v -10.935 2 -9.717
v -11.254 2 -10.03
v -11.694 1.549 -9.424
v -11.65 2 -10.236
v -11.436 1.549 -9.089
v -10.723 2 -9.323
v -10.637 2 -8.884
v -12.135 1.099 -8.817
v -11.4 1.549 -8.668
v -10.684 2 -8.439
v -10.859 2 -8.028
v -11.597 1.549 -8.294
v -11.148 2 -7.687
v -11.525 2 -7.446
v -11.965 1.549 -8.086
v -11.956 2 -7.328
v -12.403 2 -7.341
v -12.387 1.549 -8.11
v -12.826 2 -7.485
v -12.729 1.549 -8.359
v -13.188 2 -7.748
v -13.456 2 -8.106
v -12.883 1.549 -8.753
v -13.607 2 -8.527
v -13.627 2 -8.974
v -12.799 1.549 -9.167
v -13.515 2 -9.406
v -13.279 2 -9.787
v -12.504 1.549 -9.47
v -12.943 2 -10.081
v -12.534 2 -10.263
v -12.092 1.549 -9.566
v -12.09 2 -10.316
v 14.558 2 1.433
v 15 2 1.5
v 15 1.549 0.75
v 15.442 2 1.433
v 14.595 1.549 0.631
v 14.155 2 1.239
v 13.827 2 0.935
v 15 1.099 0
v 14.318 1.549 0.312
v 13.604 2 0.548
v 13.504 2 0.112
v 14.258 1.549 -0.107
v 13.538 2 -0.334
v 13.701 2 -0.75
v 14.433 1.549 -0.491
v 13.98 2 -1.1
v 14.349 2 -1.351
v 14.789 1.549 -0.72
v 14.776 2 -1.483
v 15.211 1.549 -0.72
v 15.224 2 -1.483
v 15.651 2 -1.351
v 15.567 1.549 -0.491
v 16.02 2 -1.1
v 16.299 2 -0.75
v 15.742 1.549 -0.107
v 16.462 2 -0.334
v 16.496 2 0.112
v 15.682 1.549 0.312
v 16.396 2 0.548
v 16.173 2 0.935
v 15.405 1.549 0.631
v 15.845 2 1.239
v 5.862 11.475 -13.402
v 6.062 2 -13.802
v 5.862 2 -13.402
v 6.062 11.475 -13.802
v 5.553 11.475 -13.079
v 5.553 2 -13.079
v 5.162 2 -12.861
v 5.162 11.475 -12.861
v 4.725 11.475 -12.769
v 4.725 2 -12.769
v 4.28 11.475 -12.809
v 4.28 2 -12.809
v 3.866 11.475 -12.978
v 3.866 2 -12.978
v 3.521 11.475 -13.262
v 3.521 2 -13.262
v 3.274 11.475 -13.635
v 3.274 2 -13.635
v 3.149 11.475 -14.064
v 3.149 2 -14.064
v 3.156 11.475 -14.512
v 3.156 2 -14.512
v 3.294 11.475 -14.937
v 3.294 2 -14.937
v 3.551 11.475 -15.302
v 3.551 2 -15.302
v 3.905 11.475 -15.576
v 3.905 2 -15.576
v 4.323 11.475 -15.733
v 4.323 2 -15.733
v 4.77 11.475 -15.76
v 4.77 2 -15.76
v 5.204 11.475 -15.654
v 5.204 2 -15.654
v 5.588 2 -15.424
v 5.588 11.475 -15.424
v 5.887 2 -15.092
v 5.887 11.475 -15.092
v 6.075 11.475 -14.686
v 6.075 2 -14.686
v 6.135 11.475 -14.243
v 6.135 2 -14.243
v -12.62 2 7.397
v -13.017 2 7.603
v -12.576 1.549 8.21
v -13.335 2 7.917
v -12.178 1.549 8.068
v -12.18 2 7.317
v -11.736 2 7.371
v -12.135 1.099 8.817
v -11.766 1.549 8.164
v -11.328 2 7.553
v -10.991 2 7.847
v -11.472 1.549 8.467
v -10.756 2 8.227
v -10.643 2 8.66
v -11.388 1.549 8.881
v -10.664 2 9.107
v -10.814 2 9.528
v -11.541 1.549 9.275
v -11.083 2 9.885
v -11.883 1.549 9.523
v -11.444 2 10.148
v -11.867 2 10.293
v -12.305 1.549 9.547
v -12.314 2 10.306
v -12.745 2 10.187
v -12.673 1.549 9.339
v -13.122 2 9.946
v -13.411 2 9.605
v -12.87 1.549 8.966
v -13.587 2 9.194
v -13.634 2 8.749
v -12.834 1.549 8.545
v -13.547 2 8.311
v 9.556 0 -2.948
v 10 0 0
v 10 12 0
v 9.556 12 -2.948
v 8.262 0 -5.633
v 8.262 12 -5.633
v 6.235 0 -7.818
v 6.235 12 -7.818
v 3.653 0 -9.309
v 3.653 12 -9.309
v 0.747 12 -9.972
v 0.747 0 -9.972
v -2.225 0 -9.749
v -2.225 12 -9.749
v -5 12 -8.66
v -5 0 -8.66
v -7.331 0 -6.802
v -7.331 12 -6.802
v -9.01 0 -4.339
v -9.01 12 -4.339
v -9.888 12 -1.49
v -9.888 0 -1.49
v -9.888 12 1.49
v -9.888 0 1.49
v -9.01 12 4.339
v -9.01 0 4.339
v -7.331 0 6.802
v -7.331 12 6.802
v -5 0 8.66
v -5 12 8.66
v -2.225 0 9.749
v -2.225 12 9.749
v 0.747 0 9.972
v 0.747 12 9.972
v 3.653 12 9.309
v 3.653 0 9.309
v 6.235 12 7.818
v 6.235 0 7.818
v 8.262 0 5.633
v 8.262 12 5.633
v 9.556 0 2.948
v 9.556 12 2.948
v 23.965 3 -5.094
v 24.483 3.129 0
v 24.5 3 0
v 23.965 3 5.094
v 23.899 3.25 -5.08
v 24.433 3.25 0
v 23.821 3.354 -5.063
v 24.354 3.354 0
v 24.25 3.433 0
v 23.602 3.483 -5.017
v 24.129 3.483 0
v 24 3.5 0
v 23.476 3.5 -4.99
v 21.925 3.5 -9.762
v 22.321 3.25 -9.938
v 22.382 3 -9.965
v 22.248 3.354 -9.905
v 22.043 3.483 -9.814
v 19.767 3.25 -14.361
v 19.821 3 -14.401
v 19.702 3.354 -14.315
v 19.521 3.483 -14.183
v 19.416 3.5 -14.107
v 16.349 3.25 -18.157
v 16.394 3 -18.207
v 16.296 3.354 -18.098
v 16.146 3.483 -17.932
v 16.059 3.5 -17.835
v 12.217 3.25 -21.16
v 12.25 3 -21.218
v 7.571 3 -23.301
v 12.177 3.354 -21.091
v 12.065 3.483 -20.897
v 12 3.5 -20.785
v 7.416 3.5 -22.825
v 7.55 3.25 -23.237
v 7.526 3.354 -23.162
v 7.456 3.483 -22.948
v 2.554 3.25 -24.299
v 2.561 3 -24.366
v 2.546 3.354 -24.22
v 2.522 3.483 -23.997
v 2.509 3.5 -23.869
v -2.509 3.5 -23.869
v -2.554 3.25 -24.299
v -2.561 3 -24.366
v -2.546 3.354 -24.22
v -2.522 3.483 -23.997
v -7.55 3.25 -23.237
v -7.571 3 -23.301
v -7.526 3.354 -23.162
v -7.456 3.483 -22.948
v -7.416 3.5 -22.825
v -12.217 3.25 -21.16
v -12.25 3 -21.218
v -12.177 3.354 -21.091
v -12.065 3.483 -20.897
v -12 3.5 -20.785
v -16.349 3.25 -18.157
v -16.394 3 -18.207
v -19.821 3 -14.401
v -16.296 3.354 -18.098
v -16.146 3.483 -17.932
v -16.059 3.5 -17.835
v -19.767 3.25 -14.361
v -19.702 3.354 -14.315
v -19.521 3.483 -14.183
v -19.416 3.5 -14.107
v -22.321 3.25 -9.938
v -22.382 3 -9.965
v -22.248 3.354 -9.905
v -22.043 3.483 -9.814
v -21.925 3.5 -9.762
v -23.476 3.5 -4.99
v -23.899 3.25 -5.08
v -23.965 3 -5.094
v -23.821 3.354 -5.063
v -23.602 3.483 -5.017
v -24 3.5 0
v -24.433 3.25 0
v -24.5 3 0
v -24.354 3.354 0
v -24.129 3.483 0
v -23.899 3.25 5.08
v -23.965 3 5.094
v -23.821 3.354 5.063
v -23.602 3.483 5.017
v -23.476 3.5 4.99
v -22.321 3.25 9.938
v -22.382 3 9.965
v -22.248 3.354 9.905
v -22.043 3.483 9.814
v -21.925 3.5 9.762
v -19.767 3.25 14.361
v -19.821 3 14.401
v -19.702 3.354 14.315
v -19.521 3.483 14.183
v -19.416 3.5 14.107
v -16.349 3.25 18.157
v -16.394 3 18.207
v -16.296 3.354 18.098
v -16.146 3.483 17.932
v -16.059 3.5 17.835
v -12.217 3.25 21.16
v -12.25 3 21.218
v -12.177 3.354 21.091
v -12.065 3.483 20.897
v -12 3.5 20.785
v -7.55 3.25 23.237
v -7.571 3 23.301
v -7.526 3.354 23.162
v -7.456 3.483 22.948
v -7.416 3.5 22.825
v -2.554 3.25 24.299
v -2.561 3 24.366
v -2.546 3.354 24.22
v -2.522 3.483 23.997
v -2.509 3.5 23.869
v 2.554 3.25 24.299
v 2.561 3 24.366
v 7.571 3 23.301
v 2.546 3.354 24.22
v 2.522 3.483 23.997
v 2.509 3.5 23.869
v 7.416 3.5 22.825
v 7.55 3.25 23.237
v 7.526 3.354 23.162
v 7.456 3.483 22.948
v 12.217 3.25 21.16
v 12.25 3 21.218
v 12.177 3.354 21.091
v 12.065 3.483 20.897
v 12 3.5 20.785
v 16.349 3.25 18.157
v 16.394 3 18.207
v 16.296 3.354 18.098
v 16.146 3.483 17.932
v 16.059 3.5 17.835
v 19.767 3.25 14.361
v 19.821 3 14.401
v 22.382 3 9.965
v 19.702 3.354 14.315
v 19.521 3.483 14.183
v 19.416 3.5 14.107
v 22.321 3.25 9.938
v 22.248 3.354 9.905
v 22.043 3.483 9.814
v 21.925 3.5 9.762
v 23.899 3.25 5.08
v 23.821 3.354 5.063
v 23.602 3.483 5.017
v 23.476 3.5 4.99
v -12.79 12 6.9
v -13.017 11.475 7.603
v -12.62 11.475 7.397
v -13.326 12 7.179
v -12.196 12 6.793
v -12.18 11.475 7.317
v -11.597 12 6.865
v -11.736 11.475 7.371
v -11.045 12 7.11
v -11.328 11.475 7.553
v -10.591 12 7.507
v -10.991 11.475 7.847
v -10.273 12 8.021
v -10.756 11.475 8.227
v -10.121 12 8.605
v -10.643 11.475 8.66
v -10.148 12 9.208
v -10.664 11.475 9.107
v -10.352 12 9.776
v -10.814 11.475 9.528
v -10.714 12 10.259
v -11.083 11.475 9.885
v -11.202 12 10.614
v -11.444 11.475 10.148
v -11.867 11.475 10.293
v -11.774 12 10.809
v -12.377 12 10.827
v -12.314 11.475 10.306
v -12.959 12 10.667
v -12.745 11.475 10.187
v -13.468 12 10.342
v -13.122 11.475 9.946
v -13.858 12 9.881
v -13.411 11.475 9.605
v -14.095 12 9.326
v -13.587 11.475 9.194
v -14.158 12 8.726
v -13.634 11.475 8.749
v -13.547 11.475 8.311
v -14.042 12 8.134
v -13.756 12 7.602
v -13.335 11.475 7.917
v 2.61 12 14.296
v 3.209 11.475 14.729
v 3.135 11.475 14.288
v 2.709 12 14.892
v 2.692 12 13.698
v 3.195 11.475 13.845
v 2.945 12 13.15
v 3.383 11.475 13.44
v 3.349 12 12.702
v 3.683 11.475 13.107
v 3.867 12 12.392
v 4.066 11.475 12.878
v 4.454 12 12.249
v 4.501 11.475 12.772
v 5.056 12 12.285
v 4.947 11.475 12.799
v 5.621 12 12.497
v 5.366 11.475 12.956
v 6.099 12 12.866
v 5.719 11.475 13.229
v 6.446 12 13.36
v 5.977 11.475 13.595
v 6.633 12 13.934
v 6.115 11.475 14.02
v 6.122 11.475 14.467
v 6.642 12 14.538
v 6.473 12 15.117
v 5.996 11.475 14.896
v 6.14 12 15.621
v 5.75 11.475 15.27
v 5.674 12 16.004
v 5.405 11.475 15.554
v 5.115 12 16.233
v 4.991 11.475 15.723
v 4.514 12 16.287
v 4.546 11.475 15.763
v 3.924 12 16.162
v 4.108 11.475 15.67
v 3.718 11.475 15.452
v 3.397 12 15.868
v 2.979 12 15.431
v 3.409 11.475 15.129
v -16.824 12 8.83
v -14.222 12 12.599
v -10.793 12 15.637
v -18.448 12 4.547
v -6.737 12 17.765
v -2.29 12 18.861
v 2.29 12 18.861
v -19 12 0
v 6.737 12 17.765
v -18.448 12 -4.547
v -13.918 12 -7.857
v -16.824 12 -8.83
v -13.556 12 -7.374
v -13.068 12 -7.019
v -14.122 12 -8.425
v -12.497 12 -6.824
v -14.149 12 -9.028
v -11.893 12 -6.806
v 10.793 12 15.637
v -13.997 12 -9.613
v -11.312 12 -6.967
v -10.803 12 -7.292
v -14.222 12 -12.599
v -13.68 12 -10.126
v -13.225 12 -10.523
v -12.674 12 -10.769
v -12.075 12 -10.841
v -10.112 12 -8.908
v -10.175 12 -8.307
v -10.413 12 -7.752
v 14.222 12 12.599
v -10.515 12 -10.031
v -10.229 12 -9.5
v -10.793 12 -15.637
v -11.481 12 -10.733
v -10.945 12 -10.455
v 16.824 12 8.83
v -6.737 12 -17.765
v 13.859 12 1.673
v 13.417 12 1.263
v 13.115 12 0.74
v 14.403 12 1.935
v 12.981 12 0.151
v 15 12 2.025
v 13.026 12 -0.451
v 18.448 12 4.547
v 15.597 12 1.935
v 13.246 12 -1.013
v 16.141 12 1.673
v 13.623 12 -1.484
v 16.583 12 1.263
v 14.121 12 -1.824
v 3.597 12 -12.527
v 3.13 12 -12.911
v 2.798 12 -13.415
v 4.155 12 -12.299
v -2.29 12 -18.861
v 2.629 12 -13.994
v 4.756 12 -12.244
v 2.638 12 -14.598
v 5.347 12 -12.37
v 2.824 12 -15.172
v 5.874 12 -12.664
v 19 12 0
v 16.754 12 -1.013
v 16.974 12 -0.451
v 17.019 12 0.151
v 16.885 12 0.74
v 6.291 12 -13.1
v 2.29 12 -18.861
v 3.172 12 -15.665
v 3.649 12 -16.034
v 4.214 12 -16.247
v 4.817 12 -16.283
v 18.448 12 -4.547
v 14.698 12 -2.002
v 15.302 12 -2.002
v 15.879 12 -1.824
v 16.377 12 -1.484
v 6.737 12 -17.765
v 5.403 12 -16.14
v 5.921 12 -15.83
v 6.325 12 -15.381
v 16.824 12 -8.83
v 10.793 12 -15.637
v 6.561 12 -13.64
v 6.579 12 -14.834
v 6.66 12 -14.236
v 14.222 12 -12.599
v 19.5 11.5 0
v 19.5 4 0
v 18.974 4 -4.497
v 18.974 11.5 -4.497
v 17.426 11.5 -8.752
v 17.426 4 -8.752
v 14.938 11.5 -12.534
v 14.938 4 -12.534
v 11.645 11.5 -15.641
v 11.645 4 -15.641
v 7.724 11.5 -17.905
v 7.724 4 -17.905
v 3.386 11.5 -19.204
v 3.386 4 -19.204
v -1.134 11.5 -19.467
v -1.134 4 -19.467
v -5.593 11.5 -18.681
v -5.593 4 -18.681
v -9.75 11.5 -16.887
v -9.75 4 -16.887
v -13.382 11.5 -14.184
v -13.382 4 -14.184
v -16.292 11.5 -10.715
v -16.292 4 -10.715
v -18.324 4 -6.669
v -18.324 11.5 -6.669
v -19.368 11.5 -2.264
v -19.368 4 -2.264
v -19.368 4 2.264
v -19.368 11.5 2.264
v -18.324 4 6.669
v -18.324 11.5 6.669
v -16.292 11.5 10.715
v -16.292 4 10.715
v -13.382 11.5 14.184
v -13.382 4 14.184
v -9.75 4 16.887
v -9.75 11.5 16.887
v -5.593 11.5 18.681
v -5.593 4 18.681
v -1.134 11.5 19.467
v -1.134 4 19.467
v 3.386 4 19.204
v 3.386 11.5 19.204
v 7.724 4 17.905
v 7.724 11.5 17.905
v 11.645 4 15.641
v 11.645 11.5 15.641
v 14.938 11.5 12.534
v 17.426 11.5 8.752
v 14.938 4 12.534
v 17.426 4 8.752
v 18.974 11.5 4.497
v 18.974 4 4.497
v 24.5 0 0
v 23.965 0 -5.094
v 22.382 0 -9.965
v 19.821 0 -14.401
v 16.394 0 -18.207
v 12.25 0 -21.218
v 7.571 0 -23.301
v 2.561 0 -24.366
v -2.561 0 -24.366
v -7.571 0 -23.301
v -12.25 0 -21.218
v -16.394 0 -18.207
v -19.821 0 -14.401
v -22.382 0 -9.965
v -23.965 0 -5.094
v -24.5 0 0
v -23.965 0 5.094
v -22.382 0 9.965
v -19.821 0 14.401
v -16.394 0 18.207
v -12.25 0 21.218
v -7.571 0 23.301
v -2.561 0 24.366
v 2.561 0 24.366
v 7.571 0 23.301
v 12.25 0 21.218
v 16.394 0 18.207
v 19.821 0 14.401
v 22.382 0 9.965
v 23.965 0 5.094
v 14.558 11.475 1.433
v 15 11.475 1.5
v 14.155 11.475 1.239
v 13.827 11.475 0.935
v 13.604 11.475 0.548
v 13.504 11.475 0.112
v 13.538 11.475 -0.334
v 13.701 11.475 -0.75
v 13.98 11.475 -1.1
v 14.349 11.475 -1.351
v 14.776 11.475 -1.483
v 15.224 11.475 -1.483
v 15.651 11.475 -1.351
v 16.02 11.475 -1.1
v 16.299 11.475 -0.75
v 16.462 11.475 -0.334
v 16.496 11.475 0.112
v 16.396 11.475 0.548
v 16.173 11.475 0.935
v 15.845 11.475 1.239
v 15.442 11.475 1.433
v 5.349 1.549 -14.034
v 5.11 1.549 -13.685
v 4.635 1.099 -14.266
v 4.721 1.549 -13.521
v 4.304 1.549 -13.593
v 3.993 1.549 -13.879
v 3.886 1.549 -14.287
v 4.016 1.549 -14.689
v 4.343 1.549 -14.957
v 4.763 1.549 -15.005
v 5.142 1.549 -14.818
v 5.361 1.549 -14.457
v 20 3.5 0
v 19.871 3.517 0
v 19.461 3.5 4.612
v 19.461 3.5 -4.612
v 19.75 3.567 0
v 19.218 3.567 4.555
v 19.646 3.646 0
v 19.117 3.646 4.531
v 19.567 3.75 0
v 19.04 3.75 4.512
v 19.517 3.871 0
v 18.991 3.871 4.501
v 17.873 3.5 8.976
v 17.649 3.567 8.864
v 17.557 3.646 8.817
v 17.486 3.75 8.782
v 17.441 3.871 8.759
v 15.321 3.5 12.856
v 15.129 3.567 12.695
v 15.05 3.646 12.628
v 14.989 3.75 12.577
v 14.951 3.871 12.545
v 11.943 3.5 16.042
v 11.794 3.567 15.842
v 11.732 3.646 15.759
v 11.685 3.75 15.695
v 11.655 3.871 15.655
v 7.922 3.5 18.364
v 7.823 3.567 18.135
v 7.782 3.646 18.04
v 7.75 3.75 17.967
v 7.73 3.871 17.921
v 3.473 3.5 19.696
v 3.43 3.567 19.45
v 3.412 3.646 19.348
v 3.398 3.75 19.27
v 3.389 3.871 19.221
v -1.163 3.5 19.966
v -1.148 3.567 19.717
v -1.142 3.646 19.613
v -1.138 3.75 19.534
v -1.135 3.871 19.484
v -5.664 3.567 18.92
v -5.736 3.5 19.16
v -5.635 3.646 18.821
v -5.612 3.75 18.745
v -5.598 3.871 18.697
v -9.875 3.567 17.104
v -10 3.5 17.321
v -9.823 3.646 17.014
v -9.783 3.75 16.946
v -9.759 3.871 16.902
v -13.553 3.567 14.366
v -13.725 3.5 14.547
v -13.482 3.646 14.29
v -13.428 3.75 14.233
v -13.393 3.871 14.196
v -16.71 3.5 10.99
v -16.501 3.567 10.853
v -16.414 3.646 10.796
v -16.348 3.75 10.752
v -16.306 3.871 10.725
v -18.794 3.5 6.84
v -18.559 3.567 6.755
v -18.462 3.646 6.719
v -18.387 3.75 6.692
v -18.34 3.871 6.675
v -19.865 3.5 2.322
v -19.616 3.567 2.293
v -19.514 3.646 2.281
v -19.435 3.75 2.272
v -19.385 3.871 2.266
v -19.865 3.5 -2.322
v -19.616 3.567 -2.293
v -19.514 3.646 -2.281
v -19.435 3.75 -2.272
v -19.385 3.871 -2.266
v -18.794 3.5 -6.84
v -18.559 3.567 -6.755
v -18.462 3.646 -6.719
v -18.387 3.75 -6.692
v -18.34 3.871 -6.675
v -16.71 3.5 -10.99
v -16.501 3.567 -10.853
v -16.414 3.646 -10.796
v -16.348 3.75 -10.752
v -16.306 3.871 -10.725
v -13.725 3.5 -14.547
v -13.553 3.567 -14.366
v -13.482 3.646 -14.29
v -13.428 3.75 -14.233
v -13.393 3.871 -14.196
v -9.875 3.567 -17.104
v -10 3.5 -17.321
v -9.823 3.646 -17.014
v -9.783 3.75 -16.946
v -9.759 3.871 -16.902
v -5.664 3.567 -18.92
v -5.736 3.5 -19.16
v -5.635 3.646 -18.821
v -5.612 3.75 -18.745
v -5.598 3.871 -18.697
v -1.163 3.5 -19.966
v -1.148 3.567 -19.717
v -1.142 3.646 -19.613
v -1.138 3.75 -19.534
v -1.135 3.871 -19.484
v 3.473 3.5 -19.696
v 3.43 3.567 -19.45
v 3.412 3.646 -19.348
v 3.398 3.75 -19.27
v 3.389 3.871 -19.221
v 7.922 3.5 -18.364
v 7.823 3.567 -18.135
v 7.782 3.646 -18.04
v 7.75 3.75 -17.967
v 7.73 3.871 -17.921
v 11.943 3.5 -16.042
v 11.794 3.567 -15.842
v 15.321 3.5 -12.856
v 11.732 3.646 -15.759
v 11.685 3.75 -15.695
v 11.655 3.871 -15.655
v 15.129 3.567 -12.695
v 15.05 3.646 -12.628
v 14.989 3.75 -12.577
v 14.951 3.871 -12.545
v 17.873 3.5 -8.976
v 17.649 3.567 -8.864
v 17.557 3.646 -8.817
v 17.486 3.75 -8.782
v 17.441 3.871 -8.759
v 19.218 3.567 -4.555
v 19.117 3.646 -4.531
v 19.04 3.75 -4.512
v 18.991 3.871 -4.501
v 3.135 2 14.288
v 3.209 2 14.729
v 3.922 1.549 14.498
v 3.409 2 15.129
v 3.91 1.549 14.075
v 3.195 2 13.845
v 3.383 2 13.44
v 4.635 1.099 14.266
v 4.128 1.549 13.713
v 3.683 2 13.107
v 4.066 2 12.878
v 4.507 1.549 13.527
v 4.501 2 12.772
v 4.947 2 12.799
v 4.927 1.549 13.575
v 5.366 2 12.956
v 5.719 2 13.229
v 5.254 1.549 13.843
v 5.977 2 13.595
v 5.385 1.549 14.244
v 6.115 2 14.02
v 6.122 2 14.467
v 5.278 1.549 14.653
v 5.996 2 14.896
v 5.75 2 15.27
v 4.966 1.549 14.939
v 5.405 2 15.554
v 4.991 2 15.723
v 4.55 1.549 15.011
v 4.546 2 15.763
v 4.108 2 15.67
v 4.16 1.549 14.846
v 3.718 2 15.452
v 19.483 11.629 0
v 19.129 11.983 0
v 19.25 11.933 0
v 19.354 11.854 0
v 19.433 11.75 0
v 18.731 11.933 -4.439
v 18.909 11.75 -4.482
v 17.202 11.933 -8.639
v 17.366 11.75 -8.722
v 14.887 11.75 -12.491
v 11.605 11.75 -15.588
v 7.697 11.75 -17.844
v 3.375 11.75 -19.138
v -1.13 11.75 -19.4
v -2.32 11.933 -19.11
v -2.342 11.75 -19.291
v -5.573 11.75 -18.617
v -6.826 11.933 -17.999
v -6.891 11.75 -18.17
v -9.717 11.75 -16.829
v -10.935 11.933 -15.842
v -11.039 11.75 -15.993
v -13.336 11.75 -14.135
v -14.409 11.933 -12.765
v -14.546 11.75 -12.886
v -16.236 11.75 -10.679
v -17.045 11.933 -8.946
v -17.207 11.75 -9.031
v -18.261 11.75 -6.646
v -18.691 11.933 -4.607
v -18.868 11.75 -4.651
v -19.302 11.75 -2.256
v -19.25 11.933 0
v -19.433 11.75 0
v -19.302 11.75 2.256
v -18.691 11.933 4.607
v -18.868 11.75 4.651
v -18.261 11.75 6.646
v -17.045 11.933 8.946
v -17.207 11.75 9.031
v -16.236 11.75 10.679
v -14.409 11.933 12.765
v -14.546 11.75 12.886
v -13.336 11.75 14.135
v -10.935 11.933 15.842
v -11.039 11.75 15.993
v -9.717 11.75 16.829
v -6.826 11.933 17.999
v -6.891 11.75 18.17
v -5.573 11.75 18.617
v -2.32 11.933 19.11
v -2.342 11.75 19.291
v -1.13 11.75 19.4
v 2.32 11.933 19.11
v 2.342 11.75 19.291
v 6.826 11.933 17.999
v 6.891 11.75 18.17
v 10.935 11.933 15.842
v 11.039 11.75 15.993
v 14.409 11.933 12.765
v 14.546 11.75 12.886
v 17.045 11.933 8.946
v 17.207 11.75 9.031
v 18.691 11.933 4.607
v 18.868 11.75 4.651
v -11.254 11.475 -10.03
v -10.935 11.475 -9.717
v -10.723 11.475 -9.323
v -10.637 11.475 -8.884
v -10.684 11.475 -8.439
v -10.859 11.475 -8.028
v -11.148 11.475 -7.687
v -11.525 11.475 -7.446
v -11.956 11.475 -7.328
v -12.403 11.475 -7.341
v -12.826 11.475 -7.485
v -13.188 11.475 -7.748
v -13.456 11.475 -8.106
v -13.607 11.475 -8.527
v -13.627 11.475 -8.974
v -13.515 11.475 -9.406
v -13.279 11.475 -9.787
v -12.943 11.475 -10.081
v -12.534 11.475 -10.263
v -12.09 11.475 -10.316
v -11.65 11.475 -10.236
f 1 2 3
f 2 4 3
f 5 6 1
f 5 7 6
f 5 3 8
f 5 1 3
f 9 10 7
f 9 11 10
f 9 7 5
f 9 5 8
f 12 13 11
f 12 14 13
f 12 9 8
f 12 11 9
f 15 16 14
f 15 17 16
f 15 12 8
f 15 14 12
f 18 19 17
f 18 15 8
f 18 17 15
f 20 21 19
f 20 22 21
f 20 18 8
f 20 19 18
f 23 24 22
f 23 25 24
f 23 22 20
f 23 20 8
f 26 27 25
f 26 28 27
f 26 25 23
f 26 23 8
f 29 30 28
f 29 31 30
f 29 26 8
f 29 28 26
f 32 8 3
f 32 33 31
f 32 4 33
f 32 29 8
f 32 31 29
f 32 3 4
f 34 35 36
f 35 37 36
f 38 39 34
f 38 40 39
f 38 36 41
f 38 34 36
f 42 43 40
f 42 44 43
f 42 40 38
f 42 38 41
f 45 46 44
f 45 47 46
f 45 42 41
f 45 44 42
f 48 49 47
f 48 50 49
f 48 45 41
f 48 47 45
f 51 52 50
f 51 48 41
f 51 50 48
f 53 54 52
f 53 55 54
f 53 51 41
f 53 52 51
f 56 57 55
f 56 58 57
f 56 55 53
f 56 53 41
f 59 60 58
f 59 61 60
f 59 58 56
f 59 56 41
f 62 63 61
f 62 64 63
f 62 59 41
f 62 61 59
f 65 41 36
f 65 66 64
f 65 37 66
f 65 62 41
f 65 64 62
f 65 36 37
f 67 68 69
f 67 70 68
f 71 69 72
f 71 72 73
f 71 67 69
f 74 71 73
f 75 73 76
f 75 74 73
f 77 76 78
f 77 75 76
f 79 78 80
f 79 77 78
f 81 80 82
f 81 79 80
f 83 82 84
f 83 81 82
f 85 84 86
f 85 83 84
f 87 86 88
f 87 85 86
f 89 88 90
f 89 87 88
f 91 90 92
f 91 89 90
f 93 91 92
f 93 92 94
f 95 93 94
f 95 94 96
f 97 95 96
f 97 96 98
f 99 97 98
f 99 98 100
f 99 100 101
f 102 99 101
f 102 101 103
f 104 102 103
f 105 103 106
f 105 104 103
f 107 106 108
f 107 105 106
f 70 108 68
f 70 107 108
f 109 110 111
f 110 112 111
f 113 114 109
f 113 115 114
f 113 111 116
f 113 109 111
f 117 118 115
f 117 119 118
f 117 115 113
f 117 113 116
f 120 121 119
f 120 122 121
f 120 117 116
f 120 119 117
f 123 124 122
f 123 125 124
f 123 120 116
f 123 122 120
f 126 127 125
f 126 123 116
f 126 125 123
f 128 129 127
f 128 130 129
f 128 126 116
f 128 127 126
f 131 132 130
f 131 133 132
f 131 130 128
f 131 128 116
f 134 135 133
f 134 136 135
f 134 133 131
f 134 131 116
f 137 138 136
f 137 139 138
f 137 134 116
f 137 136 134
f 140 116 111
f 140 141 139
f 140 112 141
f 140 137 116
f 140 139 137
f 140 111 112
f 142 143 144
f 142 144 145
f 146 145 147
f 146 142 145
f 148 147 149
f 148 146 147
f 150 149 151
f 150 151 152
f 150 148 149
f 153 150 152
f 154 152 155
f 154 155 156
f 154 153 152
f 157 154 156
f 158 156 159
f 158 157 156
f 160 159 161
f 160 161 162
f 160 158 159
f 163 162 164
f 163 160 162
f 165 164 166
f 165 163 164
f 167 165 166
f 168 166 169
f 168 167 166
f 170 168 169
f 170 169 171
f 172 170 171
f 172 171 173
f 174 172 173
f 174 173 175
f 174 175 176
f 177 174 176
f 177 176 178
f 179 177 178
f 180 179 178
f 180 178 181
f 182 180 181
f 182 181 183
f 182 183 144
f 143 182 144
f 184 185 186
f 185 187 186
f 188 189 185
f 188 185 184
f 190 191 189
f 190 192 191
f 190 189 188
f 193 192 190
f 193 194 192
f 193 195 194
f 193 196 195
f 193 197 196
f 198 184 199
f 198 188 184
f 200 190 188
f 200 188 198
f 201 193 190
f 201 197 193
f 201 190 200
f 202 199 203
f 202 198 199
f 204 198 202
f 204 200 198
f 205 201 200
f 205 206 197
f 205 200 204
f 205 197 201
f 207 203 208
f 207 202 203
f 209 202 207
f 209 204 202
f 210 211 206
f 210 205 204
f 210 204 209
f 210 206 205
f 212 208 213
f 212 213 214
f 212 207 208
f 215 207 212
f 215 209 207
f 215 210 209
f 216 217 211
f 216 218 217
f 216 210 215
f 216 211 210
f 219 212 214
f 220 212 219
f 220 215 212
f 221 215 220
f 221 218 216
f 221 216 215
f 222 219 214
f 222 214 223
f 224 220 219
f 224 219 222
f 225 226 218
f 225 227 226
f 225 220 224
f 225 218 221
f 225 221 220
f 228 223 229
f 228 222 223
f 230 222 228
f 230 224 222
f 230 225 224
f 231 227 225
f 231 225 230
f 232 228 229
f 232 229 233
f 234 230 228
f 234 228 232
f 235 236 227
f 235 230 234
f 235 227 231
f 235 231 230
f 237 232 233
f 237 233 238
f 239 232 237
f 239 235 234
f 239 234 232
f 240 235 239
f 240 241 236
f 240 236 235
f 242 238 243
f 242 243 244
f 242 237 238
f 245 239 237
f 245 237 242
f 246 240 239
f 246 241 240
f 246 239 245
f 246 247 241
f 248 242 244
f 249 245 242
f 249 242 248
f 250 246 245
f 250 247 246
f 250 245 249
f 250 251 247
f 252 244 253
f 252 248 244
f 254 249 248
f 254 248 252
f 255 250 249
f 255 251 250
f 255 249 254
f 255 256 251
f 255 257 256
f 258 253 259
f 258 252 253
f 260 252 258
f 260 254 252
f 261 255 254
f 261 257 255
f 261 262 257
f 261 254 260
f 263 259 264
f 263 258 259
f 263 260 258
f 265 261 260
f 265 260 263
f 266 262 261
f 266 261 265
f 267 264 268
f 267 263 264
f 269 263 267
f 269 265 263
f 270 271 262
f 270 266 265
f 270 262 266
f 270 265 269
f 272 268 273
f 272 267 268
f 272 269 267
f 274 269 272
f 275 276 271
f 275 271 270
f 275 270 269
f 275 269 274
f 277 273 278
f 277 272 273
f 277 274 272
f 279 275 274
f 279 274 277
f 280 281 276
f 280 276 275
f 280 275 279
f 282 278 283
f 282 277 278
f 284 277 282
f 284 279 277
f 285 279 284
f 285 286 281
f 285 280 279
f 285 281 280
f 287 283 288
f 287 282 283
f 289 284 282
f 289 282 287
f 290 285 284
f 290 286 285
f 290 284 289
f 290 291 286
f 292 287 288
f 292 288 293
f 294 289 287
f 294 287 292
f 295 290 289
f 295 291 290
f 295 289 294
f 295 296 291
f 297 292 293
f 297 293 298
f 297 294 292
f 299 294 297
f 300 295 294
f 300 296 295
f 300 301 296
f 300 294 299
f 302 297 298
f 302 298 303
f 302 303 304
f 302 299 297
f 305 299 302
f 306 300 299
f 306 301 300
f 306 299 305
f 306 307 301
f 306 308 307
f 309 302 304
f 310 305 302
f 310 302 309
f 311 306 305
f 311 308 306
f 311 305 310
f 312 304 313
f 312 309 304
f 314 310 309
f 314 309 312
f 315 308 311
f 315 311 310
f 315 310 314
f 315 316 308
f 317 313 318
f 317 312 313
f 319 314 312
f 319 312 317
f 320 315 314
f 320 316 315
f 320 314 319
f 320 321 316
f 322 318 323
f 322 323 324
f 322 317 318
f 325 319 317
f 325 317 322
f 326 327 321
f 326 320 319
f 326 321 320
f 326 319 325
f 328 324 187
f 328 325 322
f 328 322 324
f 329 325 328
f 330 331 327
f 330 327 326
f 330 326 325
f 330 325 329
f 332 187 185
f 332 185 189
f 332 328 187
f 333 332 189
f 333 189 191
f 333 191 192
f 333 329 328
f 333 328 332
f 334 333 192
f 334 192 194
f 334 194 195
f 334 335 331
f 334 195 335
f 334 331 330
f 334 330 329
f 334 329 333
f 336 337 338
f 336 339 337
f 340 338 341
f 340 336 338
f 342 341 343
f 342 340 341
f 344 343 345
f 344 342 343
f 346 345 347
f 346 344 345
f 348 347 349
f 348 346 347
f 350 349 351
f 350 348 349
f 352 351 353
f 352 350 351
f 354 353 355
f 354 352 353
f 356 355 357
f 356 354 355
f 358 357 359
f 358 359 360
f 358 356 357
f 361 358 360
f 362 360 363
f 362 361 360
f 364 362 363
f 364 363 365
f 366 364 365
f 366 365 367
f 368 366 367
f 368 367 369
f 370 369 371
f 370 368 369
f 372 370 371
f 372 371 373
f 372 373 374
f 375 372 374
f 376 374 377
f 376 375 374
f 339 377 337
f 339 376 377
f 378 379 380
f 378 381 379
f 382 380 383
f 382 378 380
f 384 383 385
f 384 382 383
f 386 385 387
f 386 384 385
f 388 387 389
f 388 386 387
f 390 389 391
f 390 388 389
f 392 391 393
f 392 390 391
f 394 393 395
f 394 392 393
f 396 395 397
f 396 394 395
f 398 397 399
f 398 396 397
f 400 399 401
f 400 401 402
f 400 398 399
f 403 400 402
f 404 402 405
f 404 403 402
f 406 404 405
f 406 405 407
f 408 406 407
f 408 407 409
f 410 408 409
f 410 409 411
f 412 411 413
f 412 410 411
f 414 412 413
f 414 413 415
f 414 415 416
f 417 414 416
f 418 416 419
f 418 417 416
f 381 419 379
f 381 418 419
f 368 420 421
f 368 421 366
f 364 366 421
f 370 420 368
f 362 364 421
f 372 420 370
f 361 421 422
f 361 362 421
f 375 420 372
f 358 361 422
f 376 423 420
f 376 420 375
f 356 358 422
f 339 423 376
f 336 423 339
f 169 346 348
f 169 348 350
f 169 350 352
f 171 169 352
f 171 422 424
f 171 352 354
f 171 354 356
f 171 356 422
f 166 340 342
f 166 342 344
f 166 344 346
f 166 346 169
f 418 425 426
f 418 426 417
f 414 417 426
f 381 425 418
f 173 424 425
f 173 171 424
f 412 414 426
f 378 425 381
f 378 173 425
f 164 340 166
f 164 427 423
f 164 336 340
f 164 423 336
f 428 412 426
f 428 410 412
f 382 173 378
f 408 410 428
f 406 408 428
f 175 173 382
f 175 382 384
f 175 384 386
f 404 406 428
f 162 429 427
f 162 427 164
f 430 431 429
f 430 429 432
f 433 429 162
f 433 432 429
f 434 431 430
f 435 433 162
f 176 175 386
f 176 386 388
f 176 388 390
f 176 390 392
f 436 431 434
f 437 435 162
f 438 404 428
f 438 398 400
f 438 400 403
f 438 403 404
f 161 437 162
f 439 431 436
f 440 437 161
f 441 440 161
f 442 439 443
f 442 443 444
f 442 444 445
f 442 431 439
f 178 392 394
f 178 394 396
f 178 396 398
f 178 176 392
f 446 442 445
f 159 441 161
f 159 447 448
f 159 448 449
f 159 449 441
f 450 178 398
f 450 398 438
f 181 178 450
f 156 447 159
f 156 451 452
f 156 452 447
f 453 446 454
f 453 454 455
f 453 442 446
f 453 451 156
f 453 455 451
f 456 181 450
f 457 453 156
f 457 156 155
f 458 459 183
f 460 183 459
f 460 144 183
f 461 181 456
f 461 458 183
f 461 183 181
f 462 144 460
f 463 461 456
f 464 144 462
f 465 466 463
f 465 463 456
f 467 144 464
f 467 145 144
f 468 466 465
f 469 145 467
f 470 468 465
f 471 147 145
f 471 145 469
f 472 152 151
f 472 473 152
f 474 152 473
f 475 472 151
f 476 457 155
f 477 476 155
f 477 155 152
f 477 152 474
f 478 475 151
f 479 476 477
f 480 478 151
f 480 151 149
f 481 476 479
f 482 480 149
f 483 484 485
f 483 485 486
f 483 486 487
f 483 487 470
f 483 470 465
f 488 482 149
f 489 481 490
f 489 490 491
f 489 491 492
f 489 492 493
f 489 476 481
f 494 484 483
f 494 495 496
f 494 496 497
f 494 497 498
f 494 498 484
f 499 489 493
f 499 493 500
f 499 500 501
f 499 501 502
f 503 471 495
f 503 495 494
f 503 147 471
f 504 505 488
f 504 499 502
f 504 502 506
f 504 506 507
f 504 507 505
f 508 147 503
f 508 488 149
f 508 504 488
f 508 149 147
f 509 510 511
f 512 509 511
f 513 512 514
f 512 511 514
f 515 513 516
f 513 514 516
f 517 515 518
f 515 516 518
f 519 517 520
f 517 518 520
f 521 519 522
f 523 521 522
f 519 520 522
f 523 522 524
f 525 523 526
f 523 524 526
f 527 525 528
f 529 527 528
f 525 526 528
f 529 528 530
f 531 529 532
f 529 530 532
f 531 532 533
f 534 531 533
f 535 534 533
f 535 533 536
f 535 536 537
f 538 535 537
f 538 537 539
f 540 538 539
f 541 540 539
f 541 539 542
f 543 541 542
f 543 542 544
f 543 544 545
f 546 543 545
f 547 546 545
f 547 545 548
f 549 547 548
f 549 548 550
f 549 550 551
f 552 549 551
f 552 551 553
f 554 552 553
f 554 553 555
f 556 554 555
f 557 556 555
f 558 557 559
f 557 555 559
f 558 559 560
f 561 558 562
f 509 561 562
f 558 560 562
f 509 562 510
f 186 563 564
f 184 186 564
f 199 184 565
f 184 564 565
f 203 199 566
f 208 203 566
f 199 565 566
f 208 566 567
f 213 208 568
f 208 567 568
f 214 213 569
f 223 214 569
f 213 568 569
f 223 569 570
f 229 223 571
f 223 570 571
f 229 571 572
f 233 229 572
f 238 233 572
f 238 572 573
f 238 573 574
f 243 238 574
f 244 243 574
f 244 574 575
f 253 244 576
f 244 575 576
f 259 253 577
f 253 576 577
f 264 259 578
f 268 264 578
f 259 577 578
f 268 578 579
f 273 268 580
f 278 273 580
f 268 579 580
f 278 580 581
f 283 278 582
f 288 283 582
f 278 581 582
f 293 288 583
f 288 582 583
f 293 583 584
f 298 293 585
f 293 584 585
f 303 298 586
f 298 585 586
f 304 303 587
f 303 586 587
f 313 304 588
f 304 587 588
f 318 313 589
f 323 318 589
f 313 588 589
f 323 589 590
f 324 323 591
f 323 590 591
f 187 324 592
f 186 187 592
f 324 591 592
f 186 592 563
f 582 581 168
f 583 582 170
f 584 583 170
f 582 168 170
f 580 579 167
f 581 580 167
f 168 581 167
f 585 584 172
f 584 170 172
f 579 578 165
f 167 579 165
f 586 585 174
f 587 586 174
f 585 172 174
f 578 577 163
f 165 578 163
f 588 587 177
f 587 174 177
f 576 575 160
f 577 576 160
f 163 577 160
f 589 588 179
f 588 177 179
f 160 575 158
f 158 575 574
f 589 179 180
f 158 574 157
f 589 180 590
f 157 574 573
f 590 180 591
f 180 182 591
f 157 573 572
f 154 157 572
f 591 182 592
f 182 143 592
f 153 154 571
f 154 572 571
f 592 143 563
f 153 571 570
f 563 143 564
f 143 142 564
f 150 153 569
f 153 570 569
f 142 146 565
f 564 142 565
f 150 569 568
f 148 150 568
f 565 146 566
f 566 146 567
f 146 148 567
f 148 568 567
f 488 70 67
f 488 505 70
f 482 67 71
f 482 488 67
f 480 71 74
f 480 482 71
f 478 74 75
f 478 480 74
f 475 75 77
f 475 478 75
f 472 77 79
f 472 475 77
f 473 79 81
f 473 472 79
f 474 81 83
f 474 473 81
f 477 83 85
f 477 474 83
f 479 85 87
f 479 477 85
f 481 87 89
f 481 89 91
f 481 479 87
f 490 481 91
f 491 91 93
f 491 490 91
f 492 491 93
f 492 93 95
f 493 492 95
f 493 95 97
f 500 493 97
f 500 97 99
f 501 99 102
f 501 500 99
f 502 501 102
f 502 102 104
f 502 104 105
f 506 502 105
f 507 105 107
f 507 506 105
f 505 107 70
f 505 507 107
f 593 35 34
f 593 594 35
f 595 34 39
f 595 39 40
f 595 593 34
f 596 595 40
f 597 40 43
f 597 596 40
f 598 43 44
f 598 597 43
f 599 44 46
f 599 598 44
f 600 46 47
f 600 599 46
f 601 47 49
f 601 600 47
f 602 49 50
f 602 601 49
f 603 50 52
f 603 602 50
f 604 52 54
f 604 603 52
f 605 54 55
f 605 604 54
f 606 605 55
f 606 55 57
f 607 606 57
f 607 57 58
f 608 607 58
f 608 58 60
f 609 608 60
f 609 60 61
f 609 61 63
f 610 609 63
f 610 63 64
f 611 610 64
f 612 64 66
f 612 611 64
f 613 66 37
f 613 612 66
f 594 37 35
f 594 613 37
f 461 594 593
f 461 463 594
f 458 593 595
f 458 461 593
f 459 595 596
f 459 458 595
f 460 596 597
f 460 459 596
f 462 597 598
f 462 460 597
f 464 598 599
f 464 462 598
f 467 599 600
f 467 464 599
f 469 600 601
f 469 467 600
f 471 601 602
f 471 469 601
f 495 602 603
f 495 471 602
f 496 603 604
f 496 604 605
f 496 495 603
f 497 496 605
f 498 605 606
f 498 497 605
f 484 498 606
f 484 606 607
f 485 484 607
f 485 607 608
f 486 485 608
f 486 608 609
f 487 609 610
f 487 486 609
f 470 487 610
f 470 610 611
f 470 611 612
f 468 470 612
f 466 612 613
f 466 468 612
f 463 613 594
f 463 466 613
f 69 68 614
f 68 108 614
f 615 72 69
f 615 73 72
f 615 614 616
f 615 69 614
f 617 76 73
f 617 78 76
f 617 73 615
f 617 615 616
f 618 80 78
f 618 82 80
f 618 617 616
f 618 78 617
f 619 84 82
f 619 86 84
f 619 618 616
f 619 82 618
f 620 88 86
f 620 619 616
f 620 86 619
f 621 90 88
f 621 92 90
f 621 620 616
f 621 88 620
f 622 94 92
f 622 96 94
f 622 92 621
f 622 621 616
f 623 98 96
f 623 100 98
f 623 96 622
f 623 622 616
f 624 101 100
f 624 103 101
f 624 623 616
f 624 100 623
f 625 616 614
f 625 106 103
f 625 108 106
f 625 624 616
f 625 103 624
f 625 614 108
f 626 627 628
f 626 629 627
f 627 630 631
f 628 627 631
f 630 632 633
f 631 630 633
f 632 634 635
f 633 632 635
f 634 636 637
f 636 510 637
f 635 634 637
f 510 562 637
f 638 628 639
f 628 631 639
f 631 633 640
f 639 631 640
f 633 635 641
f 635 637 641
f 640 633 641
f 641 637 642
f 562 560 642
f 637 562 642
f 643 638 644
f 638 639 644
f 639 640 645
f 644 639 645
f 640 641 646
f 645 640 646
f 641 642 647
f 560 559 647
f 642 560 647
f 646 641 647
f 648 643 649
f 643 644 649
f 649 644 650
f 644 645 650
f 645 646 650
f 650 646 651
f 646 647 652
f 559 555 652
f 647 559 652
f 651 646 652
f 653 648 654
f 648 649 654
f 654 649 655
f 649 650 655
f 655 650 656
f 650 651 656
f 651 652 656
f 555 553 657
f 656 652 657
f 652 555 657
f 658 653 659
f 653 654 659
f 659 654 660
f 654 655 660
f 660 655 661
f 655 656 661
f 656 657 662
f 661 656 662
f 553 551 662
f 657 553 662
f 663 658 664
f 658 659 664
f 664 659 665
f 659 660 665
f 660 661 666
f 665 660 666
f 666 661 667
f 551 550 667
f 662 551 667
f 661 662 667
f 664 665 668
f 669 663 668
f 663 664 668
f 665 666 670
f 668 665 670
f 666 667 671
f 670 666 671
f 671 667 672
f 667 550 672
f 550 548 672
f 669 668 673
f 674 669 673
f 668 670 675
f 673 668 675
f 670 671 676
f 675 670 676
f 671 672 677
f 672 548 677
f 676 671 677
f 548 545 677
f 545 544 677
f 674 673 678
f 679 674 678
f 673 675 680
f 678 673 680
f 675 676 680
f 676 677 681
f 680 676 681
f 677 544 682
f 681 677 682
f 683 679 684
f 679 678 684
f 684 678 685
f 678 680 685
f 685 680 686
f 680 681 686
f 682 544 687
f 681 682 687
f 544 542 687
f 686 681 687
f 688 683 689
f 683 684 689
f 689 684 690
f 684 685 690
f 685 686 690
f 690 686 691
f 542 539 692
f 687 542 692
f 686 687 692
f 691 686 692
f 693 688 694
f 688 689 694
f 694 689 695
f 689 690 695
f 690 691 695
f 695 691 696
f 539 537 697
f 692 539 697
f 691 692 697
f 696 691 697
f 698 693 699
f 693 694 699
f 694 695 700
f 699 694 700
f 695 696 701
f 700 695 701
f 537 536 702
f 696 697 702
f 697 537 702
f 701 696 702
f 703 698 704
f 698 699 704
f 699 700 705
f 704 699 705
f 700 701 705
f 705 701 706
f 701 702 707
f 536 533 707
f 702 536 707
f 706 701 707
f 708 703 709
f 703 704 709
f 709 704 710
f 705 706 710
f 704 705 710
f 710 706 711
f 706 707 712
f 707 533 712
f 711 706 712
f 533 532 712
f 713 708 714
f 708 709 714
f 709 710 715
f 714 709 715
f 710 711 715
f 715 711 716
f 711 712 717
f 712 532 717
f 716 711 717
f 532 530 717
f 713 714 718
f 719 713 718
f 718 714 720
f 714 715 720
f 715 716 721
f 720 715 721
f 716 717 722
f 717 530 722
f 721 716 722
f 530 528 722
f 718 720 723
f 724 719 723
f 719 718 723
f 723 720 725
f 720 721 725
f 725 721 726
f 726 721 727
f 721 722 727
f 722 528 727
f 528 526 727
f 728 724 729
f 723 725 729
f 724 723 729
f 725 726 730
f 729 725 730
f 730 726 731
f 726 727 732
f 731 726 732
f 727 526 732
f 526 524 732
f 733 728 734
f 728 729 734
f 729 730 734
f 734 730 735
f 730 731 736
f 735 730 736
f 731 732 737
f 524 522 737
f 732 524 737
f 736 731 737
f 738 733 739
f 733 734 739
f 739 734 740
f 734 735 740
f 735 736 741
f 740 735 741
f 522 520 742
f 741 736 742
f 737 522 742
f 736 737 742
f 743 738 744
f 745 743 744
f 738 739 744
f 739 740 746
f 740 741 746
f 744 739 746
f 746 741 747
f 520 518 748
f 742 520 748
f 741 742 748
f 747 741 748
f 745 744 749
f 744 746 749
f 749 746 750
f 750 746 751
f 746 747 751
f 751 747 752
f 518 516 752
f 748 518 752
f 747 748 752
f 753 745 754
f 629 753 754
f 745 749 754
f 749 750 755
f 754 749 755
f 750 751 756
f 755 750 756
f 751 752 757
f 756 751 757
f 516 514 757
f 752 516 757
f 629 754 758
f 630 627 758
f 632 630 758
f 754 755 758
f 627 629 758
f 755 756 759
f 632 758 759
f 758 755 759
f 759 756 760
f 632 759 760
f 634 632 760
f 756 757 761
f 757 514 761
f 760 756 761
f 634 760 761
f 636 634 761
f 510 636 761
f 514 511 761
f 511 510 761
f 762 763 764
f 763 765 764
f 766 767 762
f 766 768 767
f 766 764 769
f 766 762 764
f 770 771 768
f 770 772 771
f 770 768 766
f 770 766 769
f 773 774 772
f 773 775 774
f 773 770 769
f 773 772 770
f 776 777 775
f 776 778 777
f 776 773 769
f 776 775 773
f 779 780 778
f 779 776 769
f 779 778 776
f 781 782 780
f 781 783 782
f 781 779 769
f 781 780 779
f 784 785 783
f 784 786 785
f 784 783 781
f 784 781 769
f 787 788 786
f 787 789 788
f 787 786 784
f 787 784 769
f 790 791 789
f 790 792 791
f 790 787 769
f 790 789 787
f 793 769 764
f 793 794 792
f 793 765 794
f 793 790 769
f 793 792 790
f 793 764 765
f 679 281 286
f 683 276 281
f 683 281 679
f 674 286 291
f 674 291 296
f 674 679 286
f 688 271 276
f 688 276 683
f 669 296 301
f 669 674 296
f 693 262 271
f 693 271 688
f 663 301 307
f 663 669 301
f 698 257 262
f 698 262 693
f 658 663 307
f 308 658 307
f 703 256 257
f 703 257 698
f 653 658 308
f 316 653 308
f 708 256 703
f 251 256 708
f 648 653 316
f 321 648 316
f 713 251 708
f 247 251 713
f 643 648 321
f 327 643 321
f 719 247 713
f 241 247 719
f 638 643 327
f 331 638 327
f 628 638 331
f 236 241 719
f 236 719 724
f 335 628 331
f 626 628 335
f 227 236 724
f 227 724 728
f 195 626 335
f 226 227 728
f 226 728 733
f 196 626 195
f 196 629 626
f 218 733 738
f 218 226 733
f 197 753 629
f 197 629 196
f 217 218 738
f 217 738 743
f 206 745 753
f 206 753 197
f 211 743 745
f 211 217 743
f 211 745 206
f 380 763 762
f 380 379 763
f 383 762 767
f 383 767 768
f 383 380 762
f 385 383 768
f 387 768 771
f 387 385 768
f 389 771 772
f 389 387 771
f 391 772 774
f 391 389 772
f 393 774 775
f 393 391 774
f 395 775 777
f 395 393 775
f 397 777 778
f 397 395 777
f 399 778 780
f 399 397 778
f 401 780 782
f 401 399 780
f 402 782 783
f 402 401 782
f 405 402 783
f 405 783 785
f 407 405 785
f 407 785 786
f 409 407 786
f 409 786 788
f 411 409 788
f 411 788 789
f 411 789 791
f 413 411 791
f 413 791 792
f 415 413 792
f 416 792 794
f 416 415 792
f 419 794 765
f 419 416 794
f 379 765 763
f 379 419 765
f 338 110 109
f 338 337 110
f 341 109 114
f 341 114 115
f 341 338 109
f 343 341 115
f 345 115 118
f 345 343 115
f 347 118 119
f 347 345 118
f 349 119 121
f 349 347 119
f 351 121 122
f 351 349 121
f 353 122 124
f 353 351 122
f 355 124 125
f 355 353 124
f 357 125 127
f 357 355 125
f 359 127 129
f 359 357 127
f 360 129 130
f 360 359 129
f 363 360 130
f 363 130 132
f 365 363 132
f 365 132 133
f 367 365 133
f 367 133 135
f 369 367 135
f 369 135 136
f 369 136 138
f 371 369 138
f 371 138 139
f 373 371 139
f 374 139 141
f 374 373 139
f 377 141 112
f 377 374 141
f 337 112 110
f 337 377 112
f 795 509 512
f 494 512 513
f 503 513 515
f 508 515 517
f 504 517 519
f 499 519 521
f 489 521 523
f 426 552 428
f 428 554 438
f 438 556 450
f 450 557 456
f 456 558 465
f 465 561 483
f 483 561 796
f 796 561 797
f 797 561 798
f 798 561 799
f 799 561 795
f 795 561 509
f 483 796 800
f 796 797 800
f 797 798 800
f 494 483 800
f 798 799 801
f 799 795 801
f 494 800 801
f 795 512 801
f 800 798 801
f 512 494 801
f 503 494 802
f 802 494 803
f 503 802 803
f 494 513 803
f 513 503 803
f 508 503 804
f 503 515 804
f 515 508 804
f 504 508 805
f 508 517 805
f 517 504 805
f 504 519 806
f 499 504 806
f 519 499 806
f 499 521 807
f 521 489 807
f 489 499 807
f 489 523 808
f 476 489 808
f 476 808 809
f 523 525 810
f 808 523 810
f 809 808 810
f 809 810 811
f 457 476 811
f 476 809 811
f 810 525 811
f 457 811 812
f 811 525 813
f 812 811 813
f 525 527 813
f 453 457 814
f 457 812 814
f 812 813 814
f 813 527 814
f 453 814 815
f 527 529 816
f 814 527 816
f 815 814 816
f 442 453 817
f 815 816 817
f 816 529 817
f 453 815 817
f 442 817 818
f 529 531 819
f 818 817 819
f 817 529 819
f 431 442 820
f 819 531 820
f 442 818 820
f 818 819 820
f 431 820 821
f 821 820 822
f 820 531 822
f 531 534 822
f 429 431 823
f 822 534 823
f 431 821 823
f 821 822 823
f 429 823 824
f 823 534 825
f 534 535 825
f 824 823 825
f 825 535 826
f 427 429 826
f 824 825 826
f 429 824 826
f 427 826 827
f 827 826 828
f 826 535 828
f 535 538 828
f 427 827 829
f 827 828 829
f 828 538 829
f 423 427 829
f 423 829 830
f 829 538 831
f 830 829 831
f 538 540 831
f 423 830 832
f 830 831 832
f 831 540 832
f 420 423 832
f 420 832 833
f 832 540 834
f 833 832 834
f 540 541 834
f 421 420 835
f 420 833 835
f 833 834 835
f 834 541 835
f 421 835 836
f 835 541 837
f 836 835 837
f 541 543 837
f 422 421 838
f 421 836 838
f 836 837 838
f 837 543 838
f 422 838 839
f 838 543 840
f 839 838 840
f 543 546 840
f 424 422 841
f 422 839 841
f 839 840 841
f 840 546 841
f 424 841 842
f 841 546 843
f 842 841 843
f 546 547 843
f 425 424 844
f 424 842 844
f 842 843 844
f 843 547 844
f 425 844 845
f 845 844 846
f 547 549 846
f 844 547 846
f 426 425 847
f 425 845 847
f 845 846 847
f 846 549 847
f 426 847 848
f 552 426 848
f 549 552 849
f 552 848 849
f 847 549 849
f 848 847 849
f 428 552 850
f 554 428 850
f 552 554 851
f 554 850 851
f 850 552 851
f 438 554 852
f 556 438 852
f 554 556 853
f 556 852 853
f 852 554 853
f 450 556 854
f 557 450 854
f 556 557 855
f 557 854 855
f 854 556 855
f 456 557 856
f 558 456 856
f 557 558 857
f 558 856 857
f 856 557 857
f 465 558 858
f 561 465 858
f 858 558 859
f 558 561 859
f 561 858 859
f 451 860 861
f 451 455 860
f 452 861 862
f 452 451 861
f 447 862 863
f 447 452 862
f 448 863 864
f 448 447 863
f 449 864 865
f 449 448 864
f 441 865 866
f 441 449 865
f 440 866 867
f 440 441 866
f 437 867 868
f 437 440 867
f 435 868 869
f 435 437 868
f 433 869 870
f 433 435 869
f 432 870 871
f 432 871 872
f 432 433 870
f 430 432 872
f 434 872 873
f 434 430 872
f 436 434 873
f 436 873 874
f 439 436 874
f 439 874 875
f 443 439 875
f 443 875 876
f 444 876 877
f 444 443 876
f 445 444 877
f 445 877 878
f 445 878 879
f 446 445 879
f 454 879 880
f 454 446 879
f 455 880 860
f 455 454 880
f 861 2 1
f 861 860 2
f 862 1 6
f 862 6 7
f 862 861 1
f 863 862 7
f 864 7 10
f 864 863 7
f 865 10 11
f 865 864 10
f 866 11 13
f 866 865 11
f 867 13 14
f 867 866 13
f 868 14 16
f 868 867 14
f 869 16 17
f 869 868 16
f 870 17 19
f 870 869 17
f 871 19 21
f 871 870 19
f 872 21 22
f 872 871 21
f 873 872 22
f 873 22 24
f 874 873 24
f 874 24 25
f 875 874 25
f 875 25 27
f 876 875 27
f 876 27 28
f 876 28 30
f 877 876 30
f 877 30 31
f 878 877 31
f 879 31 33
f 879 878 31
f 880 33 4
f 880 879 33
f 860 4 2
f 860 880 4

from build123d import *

# Parameters (mm, degrees)
SKETCH1_R          = 24.5
SKETCH1_R_2        = 10
EXTRUDE1_DEPTH     = 3.5
SKETCH1_3_R        = 19.5
SKETCH1_3_R_2      = 10
EXTRUDE2_DEPTH     = 12
CIRPATTERN1_COUNT  = 5
FINISHING_FILLET_R = 0.5


with BuildPart() as part:
    # Sketch1 → Extrude1 (new body)
    with BuildSketch(Plane(origin=(0, 0, 0), x_dir=(1, 0, 0), z_dir=(0, 1, 0))):
        Circle(SKETCH1_R)
        Circle(SKETCH1_R_2, mode=Mode.SUBTRACT)
    extrude(amount=EXTRUDE1_DEPTH)

    # Sketch1<3> → Extrude2 (add)
    with BuildSketch(Plane(origin=(0, 0, 0), x_dir=(1, 0, 0), z_dir=(0, 1, 0))):
        Circle(SKETCH1_3_R)
        Circle(SKETCH1_3_R_2, mode=Mode.SUBTRACT)
    extrude(amount=EXTRUDE2_DEPTH)

    # Sketch3 → Ø3.0 Diameter Hole1 (revolve, cut)
    with BuildSketch(Plane(origin=(15, 12, 0), x_dir=(0, 0, 1), z_dir=(1, 0, 0))):
        Polygon((0, 0), (0, 10.901290929), (1.5, 10), (1.5, 0.525), (2.025, 0), align=None)
    f_3_0_diameter_hole1 = revolve(axis=Axis((15, 18.35, 0), (0, -1, 0)), mode=Mode.SUBTRACT)

    # CirPattern1: Ø3.0 Diameter Hole1 ×5 about axis
    cirpattern1_axis = Axis((0, 12, 0), (0, -1, 0))
    for i in range(1, CIRPATTERN1_COUNT):
        add(f_3_0_diameter_hole1.rotate(cirpattern1_axis, i * 360 / CIRPATTERN1_COUNT), mode=Mode.SUBTRACT)

    # Finishing Fillet
    finishing_fillet_edges = [part.edges().sort_by_distance(p)[0] for p in [
        (-19.5, 12, 0),
        (-19.5, 3.5, 0),
        (-24.5, 3.5, 0),
    ]]
    fillet(finishing_fillet_edges, radius=FINISHING_FILLET_R)


solid = part.part
